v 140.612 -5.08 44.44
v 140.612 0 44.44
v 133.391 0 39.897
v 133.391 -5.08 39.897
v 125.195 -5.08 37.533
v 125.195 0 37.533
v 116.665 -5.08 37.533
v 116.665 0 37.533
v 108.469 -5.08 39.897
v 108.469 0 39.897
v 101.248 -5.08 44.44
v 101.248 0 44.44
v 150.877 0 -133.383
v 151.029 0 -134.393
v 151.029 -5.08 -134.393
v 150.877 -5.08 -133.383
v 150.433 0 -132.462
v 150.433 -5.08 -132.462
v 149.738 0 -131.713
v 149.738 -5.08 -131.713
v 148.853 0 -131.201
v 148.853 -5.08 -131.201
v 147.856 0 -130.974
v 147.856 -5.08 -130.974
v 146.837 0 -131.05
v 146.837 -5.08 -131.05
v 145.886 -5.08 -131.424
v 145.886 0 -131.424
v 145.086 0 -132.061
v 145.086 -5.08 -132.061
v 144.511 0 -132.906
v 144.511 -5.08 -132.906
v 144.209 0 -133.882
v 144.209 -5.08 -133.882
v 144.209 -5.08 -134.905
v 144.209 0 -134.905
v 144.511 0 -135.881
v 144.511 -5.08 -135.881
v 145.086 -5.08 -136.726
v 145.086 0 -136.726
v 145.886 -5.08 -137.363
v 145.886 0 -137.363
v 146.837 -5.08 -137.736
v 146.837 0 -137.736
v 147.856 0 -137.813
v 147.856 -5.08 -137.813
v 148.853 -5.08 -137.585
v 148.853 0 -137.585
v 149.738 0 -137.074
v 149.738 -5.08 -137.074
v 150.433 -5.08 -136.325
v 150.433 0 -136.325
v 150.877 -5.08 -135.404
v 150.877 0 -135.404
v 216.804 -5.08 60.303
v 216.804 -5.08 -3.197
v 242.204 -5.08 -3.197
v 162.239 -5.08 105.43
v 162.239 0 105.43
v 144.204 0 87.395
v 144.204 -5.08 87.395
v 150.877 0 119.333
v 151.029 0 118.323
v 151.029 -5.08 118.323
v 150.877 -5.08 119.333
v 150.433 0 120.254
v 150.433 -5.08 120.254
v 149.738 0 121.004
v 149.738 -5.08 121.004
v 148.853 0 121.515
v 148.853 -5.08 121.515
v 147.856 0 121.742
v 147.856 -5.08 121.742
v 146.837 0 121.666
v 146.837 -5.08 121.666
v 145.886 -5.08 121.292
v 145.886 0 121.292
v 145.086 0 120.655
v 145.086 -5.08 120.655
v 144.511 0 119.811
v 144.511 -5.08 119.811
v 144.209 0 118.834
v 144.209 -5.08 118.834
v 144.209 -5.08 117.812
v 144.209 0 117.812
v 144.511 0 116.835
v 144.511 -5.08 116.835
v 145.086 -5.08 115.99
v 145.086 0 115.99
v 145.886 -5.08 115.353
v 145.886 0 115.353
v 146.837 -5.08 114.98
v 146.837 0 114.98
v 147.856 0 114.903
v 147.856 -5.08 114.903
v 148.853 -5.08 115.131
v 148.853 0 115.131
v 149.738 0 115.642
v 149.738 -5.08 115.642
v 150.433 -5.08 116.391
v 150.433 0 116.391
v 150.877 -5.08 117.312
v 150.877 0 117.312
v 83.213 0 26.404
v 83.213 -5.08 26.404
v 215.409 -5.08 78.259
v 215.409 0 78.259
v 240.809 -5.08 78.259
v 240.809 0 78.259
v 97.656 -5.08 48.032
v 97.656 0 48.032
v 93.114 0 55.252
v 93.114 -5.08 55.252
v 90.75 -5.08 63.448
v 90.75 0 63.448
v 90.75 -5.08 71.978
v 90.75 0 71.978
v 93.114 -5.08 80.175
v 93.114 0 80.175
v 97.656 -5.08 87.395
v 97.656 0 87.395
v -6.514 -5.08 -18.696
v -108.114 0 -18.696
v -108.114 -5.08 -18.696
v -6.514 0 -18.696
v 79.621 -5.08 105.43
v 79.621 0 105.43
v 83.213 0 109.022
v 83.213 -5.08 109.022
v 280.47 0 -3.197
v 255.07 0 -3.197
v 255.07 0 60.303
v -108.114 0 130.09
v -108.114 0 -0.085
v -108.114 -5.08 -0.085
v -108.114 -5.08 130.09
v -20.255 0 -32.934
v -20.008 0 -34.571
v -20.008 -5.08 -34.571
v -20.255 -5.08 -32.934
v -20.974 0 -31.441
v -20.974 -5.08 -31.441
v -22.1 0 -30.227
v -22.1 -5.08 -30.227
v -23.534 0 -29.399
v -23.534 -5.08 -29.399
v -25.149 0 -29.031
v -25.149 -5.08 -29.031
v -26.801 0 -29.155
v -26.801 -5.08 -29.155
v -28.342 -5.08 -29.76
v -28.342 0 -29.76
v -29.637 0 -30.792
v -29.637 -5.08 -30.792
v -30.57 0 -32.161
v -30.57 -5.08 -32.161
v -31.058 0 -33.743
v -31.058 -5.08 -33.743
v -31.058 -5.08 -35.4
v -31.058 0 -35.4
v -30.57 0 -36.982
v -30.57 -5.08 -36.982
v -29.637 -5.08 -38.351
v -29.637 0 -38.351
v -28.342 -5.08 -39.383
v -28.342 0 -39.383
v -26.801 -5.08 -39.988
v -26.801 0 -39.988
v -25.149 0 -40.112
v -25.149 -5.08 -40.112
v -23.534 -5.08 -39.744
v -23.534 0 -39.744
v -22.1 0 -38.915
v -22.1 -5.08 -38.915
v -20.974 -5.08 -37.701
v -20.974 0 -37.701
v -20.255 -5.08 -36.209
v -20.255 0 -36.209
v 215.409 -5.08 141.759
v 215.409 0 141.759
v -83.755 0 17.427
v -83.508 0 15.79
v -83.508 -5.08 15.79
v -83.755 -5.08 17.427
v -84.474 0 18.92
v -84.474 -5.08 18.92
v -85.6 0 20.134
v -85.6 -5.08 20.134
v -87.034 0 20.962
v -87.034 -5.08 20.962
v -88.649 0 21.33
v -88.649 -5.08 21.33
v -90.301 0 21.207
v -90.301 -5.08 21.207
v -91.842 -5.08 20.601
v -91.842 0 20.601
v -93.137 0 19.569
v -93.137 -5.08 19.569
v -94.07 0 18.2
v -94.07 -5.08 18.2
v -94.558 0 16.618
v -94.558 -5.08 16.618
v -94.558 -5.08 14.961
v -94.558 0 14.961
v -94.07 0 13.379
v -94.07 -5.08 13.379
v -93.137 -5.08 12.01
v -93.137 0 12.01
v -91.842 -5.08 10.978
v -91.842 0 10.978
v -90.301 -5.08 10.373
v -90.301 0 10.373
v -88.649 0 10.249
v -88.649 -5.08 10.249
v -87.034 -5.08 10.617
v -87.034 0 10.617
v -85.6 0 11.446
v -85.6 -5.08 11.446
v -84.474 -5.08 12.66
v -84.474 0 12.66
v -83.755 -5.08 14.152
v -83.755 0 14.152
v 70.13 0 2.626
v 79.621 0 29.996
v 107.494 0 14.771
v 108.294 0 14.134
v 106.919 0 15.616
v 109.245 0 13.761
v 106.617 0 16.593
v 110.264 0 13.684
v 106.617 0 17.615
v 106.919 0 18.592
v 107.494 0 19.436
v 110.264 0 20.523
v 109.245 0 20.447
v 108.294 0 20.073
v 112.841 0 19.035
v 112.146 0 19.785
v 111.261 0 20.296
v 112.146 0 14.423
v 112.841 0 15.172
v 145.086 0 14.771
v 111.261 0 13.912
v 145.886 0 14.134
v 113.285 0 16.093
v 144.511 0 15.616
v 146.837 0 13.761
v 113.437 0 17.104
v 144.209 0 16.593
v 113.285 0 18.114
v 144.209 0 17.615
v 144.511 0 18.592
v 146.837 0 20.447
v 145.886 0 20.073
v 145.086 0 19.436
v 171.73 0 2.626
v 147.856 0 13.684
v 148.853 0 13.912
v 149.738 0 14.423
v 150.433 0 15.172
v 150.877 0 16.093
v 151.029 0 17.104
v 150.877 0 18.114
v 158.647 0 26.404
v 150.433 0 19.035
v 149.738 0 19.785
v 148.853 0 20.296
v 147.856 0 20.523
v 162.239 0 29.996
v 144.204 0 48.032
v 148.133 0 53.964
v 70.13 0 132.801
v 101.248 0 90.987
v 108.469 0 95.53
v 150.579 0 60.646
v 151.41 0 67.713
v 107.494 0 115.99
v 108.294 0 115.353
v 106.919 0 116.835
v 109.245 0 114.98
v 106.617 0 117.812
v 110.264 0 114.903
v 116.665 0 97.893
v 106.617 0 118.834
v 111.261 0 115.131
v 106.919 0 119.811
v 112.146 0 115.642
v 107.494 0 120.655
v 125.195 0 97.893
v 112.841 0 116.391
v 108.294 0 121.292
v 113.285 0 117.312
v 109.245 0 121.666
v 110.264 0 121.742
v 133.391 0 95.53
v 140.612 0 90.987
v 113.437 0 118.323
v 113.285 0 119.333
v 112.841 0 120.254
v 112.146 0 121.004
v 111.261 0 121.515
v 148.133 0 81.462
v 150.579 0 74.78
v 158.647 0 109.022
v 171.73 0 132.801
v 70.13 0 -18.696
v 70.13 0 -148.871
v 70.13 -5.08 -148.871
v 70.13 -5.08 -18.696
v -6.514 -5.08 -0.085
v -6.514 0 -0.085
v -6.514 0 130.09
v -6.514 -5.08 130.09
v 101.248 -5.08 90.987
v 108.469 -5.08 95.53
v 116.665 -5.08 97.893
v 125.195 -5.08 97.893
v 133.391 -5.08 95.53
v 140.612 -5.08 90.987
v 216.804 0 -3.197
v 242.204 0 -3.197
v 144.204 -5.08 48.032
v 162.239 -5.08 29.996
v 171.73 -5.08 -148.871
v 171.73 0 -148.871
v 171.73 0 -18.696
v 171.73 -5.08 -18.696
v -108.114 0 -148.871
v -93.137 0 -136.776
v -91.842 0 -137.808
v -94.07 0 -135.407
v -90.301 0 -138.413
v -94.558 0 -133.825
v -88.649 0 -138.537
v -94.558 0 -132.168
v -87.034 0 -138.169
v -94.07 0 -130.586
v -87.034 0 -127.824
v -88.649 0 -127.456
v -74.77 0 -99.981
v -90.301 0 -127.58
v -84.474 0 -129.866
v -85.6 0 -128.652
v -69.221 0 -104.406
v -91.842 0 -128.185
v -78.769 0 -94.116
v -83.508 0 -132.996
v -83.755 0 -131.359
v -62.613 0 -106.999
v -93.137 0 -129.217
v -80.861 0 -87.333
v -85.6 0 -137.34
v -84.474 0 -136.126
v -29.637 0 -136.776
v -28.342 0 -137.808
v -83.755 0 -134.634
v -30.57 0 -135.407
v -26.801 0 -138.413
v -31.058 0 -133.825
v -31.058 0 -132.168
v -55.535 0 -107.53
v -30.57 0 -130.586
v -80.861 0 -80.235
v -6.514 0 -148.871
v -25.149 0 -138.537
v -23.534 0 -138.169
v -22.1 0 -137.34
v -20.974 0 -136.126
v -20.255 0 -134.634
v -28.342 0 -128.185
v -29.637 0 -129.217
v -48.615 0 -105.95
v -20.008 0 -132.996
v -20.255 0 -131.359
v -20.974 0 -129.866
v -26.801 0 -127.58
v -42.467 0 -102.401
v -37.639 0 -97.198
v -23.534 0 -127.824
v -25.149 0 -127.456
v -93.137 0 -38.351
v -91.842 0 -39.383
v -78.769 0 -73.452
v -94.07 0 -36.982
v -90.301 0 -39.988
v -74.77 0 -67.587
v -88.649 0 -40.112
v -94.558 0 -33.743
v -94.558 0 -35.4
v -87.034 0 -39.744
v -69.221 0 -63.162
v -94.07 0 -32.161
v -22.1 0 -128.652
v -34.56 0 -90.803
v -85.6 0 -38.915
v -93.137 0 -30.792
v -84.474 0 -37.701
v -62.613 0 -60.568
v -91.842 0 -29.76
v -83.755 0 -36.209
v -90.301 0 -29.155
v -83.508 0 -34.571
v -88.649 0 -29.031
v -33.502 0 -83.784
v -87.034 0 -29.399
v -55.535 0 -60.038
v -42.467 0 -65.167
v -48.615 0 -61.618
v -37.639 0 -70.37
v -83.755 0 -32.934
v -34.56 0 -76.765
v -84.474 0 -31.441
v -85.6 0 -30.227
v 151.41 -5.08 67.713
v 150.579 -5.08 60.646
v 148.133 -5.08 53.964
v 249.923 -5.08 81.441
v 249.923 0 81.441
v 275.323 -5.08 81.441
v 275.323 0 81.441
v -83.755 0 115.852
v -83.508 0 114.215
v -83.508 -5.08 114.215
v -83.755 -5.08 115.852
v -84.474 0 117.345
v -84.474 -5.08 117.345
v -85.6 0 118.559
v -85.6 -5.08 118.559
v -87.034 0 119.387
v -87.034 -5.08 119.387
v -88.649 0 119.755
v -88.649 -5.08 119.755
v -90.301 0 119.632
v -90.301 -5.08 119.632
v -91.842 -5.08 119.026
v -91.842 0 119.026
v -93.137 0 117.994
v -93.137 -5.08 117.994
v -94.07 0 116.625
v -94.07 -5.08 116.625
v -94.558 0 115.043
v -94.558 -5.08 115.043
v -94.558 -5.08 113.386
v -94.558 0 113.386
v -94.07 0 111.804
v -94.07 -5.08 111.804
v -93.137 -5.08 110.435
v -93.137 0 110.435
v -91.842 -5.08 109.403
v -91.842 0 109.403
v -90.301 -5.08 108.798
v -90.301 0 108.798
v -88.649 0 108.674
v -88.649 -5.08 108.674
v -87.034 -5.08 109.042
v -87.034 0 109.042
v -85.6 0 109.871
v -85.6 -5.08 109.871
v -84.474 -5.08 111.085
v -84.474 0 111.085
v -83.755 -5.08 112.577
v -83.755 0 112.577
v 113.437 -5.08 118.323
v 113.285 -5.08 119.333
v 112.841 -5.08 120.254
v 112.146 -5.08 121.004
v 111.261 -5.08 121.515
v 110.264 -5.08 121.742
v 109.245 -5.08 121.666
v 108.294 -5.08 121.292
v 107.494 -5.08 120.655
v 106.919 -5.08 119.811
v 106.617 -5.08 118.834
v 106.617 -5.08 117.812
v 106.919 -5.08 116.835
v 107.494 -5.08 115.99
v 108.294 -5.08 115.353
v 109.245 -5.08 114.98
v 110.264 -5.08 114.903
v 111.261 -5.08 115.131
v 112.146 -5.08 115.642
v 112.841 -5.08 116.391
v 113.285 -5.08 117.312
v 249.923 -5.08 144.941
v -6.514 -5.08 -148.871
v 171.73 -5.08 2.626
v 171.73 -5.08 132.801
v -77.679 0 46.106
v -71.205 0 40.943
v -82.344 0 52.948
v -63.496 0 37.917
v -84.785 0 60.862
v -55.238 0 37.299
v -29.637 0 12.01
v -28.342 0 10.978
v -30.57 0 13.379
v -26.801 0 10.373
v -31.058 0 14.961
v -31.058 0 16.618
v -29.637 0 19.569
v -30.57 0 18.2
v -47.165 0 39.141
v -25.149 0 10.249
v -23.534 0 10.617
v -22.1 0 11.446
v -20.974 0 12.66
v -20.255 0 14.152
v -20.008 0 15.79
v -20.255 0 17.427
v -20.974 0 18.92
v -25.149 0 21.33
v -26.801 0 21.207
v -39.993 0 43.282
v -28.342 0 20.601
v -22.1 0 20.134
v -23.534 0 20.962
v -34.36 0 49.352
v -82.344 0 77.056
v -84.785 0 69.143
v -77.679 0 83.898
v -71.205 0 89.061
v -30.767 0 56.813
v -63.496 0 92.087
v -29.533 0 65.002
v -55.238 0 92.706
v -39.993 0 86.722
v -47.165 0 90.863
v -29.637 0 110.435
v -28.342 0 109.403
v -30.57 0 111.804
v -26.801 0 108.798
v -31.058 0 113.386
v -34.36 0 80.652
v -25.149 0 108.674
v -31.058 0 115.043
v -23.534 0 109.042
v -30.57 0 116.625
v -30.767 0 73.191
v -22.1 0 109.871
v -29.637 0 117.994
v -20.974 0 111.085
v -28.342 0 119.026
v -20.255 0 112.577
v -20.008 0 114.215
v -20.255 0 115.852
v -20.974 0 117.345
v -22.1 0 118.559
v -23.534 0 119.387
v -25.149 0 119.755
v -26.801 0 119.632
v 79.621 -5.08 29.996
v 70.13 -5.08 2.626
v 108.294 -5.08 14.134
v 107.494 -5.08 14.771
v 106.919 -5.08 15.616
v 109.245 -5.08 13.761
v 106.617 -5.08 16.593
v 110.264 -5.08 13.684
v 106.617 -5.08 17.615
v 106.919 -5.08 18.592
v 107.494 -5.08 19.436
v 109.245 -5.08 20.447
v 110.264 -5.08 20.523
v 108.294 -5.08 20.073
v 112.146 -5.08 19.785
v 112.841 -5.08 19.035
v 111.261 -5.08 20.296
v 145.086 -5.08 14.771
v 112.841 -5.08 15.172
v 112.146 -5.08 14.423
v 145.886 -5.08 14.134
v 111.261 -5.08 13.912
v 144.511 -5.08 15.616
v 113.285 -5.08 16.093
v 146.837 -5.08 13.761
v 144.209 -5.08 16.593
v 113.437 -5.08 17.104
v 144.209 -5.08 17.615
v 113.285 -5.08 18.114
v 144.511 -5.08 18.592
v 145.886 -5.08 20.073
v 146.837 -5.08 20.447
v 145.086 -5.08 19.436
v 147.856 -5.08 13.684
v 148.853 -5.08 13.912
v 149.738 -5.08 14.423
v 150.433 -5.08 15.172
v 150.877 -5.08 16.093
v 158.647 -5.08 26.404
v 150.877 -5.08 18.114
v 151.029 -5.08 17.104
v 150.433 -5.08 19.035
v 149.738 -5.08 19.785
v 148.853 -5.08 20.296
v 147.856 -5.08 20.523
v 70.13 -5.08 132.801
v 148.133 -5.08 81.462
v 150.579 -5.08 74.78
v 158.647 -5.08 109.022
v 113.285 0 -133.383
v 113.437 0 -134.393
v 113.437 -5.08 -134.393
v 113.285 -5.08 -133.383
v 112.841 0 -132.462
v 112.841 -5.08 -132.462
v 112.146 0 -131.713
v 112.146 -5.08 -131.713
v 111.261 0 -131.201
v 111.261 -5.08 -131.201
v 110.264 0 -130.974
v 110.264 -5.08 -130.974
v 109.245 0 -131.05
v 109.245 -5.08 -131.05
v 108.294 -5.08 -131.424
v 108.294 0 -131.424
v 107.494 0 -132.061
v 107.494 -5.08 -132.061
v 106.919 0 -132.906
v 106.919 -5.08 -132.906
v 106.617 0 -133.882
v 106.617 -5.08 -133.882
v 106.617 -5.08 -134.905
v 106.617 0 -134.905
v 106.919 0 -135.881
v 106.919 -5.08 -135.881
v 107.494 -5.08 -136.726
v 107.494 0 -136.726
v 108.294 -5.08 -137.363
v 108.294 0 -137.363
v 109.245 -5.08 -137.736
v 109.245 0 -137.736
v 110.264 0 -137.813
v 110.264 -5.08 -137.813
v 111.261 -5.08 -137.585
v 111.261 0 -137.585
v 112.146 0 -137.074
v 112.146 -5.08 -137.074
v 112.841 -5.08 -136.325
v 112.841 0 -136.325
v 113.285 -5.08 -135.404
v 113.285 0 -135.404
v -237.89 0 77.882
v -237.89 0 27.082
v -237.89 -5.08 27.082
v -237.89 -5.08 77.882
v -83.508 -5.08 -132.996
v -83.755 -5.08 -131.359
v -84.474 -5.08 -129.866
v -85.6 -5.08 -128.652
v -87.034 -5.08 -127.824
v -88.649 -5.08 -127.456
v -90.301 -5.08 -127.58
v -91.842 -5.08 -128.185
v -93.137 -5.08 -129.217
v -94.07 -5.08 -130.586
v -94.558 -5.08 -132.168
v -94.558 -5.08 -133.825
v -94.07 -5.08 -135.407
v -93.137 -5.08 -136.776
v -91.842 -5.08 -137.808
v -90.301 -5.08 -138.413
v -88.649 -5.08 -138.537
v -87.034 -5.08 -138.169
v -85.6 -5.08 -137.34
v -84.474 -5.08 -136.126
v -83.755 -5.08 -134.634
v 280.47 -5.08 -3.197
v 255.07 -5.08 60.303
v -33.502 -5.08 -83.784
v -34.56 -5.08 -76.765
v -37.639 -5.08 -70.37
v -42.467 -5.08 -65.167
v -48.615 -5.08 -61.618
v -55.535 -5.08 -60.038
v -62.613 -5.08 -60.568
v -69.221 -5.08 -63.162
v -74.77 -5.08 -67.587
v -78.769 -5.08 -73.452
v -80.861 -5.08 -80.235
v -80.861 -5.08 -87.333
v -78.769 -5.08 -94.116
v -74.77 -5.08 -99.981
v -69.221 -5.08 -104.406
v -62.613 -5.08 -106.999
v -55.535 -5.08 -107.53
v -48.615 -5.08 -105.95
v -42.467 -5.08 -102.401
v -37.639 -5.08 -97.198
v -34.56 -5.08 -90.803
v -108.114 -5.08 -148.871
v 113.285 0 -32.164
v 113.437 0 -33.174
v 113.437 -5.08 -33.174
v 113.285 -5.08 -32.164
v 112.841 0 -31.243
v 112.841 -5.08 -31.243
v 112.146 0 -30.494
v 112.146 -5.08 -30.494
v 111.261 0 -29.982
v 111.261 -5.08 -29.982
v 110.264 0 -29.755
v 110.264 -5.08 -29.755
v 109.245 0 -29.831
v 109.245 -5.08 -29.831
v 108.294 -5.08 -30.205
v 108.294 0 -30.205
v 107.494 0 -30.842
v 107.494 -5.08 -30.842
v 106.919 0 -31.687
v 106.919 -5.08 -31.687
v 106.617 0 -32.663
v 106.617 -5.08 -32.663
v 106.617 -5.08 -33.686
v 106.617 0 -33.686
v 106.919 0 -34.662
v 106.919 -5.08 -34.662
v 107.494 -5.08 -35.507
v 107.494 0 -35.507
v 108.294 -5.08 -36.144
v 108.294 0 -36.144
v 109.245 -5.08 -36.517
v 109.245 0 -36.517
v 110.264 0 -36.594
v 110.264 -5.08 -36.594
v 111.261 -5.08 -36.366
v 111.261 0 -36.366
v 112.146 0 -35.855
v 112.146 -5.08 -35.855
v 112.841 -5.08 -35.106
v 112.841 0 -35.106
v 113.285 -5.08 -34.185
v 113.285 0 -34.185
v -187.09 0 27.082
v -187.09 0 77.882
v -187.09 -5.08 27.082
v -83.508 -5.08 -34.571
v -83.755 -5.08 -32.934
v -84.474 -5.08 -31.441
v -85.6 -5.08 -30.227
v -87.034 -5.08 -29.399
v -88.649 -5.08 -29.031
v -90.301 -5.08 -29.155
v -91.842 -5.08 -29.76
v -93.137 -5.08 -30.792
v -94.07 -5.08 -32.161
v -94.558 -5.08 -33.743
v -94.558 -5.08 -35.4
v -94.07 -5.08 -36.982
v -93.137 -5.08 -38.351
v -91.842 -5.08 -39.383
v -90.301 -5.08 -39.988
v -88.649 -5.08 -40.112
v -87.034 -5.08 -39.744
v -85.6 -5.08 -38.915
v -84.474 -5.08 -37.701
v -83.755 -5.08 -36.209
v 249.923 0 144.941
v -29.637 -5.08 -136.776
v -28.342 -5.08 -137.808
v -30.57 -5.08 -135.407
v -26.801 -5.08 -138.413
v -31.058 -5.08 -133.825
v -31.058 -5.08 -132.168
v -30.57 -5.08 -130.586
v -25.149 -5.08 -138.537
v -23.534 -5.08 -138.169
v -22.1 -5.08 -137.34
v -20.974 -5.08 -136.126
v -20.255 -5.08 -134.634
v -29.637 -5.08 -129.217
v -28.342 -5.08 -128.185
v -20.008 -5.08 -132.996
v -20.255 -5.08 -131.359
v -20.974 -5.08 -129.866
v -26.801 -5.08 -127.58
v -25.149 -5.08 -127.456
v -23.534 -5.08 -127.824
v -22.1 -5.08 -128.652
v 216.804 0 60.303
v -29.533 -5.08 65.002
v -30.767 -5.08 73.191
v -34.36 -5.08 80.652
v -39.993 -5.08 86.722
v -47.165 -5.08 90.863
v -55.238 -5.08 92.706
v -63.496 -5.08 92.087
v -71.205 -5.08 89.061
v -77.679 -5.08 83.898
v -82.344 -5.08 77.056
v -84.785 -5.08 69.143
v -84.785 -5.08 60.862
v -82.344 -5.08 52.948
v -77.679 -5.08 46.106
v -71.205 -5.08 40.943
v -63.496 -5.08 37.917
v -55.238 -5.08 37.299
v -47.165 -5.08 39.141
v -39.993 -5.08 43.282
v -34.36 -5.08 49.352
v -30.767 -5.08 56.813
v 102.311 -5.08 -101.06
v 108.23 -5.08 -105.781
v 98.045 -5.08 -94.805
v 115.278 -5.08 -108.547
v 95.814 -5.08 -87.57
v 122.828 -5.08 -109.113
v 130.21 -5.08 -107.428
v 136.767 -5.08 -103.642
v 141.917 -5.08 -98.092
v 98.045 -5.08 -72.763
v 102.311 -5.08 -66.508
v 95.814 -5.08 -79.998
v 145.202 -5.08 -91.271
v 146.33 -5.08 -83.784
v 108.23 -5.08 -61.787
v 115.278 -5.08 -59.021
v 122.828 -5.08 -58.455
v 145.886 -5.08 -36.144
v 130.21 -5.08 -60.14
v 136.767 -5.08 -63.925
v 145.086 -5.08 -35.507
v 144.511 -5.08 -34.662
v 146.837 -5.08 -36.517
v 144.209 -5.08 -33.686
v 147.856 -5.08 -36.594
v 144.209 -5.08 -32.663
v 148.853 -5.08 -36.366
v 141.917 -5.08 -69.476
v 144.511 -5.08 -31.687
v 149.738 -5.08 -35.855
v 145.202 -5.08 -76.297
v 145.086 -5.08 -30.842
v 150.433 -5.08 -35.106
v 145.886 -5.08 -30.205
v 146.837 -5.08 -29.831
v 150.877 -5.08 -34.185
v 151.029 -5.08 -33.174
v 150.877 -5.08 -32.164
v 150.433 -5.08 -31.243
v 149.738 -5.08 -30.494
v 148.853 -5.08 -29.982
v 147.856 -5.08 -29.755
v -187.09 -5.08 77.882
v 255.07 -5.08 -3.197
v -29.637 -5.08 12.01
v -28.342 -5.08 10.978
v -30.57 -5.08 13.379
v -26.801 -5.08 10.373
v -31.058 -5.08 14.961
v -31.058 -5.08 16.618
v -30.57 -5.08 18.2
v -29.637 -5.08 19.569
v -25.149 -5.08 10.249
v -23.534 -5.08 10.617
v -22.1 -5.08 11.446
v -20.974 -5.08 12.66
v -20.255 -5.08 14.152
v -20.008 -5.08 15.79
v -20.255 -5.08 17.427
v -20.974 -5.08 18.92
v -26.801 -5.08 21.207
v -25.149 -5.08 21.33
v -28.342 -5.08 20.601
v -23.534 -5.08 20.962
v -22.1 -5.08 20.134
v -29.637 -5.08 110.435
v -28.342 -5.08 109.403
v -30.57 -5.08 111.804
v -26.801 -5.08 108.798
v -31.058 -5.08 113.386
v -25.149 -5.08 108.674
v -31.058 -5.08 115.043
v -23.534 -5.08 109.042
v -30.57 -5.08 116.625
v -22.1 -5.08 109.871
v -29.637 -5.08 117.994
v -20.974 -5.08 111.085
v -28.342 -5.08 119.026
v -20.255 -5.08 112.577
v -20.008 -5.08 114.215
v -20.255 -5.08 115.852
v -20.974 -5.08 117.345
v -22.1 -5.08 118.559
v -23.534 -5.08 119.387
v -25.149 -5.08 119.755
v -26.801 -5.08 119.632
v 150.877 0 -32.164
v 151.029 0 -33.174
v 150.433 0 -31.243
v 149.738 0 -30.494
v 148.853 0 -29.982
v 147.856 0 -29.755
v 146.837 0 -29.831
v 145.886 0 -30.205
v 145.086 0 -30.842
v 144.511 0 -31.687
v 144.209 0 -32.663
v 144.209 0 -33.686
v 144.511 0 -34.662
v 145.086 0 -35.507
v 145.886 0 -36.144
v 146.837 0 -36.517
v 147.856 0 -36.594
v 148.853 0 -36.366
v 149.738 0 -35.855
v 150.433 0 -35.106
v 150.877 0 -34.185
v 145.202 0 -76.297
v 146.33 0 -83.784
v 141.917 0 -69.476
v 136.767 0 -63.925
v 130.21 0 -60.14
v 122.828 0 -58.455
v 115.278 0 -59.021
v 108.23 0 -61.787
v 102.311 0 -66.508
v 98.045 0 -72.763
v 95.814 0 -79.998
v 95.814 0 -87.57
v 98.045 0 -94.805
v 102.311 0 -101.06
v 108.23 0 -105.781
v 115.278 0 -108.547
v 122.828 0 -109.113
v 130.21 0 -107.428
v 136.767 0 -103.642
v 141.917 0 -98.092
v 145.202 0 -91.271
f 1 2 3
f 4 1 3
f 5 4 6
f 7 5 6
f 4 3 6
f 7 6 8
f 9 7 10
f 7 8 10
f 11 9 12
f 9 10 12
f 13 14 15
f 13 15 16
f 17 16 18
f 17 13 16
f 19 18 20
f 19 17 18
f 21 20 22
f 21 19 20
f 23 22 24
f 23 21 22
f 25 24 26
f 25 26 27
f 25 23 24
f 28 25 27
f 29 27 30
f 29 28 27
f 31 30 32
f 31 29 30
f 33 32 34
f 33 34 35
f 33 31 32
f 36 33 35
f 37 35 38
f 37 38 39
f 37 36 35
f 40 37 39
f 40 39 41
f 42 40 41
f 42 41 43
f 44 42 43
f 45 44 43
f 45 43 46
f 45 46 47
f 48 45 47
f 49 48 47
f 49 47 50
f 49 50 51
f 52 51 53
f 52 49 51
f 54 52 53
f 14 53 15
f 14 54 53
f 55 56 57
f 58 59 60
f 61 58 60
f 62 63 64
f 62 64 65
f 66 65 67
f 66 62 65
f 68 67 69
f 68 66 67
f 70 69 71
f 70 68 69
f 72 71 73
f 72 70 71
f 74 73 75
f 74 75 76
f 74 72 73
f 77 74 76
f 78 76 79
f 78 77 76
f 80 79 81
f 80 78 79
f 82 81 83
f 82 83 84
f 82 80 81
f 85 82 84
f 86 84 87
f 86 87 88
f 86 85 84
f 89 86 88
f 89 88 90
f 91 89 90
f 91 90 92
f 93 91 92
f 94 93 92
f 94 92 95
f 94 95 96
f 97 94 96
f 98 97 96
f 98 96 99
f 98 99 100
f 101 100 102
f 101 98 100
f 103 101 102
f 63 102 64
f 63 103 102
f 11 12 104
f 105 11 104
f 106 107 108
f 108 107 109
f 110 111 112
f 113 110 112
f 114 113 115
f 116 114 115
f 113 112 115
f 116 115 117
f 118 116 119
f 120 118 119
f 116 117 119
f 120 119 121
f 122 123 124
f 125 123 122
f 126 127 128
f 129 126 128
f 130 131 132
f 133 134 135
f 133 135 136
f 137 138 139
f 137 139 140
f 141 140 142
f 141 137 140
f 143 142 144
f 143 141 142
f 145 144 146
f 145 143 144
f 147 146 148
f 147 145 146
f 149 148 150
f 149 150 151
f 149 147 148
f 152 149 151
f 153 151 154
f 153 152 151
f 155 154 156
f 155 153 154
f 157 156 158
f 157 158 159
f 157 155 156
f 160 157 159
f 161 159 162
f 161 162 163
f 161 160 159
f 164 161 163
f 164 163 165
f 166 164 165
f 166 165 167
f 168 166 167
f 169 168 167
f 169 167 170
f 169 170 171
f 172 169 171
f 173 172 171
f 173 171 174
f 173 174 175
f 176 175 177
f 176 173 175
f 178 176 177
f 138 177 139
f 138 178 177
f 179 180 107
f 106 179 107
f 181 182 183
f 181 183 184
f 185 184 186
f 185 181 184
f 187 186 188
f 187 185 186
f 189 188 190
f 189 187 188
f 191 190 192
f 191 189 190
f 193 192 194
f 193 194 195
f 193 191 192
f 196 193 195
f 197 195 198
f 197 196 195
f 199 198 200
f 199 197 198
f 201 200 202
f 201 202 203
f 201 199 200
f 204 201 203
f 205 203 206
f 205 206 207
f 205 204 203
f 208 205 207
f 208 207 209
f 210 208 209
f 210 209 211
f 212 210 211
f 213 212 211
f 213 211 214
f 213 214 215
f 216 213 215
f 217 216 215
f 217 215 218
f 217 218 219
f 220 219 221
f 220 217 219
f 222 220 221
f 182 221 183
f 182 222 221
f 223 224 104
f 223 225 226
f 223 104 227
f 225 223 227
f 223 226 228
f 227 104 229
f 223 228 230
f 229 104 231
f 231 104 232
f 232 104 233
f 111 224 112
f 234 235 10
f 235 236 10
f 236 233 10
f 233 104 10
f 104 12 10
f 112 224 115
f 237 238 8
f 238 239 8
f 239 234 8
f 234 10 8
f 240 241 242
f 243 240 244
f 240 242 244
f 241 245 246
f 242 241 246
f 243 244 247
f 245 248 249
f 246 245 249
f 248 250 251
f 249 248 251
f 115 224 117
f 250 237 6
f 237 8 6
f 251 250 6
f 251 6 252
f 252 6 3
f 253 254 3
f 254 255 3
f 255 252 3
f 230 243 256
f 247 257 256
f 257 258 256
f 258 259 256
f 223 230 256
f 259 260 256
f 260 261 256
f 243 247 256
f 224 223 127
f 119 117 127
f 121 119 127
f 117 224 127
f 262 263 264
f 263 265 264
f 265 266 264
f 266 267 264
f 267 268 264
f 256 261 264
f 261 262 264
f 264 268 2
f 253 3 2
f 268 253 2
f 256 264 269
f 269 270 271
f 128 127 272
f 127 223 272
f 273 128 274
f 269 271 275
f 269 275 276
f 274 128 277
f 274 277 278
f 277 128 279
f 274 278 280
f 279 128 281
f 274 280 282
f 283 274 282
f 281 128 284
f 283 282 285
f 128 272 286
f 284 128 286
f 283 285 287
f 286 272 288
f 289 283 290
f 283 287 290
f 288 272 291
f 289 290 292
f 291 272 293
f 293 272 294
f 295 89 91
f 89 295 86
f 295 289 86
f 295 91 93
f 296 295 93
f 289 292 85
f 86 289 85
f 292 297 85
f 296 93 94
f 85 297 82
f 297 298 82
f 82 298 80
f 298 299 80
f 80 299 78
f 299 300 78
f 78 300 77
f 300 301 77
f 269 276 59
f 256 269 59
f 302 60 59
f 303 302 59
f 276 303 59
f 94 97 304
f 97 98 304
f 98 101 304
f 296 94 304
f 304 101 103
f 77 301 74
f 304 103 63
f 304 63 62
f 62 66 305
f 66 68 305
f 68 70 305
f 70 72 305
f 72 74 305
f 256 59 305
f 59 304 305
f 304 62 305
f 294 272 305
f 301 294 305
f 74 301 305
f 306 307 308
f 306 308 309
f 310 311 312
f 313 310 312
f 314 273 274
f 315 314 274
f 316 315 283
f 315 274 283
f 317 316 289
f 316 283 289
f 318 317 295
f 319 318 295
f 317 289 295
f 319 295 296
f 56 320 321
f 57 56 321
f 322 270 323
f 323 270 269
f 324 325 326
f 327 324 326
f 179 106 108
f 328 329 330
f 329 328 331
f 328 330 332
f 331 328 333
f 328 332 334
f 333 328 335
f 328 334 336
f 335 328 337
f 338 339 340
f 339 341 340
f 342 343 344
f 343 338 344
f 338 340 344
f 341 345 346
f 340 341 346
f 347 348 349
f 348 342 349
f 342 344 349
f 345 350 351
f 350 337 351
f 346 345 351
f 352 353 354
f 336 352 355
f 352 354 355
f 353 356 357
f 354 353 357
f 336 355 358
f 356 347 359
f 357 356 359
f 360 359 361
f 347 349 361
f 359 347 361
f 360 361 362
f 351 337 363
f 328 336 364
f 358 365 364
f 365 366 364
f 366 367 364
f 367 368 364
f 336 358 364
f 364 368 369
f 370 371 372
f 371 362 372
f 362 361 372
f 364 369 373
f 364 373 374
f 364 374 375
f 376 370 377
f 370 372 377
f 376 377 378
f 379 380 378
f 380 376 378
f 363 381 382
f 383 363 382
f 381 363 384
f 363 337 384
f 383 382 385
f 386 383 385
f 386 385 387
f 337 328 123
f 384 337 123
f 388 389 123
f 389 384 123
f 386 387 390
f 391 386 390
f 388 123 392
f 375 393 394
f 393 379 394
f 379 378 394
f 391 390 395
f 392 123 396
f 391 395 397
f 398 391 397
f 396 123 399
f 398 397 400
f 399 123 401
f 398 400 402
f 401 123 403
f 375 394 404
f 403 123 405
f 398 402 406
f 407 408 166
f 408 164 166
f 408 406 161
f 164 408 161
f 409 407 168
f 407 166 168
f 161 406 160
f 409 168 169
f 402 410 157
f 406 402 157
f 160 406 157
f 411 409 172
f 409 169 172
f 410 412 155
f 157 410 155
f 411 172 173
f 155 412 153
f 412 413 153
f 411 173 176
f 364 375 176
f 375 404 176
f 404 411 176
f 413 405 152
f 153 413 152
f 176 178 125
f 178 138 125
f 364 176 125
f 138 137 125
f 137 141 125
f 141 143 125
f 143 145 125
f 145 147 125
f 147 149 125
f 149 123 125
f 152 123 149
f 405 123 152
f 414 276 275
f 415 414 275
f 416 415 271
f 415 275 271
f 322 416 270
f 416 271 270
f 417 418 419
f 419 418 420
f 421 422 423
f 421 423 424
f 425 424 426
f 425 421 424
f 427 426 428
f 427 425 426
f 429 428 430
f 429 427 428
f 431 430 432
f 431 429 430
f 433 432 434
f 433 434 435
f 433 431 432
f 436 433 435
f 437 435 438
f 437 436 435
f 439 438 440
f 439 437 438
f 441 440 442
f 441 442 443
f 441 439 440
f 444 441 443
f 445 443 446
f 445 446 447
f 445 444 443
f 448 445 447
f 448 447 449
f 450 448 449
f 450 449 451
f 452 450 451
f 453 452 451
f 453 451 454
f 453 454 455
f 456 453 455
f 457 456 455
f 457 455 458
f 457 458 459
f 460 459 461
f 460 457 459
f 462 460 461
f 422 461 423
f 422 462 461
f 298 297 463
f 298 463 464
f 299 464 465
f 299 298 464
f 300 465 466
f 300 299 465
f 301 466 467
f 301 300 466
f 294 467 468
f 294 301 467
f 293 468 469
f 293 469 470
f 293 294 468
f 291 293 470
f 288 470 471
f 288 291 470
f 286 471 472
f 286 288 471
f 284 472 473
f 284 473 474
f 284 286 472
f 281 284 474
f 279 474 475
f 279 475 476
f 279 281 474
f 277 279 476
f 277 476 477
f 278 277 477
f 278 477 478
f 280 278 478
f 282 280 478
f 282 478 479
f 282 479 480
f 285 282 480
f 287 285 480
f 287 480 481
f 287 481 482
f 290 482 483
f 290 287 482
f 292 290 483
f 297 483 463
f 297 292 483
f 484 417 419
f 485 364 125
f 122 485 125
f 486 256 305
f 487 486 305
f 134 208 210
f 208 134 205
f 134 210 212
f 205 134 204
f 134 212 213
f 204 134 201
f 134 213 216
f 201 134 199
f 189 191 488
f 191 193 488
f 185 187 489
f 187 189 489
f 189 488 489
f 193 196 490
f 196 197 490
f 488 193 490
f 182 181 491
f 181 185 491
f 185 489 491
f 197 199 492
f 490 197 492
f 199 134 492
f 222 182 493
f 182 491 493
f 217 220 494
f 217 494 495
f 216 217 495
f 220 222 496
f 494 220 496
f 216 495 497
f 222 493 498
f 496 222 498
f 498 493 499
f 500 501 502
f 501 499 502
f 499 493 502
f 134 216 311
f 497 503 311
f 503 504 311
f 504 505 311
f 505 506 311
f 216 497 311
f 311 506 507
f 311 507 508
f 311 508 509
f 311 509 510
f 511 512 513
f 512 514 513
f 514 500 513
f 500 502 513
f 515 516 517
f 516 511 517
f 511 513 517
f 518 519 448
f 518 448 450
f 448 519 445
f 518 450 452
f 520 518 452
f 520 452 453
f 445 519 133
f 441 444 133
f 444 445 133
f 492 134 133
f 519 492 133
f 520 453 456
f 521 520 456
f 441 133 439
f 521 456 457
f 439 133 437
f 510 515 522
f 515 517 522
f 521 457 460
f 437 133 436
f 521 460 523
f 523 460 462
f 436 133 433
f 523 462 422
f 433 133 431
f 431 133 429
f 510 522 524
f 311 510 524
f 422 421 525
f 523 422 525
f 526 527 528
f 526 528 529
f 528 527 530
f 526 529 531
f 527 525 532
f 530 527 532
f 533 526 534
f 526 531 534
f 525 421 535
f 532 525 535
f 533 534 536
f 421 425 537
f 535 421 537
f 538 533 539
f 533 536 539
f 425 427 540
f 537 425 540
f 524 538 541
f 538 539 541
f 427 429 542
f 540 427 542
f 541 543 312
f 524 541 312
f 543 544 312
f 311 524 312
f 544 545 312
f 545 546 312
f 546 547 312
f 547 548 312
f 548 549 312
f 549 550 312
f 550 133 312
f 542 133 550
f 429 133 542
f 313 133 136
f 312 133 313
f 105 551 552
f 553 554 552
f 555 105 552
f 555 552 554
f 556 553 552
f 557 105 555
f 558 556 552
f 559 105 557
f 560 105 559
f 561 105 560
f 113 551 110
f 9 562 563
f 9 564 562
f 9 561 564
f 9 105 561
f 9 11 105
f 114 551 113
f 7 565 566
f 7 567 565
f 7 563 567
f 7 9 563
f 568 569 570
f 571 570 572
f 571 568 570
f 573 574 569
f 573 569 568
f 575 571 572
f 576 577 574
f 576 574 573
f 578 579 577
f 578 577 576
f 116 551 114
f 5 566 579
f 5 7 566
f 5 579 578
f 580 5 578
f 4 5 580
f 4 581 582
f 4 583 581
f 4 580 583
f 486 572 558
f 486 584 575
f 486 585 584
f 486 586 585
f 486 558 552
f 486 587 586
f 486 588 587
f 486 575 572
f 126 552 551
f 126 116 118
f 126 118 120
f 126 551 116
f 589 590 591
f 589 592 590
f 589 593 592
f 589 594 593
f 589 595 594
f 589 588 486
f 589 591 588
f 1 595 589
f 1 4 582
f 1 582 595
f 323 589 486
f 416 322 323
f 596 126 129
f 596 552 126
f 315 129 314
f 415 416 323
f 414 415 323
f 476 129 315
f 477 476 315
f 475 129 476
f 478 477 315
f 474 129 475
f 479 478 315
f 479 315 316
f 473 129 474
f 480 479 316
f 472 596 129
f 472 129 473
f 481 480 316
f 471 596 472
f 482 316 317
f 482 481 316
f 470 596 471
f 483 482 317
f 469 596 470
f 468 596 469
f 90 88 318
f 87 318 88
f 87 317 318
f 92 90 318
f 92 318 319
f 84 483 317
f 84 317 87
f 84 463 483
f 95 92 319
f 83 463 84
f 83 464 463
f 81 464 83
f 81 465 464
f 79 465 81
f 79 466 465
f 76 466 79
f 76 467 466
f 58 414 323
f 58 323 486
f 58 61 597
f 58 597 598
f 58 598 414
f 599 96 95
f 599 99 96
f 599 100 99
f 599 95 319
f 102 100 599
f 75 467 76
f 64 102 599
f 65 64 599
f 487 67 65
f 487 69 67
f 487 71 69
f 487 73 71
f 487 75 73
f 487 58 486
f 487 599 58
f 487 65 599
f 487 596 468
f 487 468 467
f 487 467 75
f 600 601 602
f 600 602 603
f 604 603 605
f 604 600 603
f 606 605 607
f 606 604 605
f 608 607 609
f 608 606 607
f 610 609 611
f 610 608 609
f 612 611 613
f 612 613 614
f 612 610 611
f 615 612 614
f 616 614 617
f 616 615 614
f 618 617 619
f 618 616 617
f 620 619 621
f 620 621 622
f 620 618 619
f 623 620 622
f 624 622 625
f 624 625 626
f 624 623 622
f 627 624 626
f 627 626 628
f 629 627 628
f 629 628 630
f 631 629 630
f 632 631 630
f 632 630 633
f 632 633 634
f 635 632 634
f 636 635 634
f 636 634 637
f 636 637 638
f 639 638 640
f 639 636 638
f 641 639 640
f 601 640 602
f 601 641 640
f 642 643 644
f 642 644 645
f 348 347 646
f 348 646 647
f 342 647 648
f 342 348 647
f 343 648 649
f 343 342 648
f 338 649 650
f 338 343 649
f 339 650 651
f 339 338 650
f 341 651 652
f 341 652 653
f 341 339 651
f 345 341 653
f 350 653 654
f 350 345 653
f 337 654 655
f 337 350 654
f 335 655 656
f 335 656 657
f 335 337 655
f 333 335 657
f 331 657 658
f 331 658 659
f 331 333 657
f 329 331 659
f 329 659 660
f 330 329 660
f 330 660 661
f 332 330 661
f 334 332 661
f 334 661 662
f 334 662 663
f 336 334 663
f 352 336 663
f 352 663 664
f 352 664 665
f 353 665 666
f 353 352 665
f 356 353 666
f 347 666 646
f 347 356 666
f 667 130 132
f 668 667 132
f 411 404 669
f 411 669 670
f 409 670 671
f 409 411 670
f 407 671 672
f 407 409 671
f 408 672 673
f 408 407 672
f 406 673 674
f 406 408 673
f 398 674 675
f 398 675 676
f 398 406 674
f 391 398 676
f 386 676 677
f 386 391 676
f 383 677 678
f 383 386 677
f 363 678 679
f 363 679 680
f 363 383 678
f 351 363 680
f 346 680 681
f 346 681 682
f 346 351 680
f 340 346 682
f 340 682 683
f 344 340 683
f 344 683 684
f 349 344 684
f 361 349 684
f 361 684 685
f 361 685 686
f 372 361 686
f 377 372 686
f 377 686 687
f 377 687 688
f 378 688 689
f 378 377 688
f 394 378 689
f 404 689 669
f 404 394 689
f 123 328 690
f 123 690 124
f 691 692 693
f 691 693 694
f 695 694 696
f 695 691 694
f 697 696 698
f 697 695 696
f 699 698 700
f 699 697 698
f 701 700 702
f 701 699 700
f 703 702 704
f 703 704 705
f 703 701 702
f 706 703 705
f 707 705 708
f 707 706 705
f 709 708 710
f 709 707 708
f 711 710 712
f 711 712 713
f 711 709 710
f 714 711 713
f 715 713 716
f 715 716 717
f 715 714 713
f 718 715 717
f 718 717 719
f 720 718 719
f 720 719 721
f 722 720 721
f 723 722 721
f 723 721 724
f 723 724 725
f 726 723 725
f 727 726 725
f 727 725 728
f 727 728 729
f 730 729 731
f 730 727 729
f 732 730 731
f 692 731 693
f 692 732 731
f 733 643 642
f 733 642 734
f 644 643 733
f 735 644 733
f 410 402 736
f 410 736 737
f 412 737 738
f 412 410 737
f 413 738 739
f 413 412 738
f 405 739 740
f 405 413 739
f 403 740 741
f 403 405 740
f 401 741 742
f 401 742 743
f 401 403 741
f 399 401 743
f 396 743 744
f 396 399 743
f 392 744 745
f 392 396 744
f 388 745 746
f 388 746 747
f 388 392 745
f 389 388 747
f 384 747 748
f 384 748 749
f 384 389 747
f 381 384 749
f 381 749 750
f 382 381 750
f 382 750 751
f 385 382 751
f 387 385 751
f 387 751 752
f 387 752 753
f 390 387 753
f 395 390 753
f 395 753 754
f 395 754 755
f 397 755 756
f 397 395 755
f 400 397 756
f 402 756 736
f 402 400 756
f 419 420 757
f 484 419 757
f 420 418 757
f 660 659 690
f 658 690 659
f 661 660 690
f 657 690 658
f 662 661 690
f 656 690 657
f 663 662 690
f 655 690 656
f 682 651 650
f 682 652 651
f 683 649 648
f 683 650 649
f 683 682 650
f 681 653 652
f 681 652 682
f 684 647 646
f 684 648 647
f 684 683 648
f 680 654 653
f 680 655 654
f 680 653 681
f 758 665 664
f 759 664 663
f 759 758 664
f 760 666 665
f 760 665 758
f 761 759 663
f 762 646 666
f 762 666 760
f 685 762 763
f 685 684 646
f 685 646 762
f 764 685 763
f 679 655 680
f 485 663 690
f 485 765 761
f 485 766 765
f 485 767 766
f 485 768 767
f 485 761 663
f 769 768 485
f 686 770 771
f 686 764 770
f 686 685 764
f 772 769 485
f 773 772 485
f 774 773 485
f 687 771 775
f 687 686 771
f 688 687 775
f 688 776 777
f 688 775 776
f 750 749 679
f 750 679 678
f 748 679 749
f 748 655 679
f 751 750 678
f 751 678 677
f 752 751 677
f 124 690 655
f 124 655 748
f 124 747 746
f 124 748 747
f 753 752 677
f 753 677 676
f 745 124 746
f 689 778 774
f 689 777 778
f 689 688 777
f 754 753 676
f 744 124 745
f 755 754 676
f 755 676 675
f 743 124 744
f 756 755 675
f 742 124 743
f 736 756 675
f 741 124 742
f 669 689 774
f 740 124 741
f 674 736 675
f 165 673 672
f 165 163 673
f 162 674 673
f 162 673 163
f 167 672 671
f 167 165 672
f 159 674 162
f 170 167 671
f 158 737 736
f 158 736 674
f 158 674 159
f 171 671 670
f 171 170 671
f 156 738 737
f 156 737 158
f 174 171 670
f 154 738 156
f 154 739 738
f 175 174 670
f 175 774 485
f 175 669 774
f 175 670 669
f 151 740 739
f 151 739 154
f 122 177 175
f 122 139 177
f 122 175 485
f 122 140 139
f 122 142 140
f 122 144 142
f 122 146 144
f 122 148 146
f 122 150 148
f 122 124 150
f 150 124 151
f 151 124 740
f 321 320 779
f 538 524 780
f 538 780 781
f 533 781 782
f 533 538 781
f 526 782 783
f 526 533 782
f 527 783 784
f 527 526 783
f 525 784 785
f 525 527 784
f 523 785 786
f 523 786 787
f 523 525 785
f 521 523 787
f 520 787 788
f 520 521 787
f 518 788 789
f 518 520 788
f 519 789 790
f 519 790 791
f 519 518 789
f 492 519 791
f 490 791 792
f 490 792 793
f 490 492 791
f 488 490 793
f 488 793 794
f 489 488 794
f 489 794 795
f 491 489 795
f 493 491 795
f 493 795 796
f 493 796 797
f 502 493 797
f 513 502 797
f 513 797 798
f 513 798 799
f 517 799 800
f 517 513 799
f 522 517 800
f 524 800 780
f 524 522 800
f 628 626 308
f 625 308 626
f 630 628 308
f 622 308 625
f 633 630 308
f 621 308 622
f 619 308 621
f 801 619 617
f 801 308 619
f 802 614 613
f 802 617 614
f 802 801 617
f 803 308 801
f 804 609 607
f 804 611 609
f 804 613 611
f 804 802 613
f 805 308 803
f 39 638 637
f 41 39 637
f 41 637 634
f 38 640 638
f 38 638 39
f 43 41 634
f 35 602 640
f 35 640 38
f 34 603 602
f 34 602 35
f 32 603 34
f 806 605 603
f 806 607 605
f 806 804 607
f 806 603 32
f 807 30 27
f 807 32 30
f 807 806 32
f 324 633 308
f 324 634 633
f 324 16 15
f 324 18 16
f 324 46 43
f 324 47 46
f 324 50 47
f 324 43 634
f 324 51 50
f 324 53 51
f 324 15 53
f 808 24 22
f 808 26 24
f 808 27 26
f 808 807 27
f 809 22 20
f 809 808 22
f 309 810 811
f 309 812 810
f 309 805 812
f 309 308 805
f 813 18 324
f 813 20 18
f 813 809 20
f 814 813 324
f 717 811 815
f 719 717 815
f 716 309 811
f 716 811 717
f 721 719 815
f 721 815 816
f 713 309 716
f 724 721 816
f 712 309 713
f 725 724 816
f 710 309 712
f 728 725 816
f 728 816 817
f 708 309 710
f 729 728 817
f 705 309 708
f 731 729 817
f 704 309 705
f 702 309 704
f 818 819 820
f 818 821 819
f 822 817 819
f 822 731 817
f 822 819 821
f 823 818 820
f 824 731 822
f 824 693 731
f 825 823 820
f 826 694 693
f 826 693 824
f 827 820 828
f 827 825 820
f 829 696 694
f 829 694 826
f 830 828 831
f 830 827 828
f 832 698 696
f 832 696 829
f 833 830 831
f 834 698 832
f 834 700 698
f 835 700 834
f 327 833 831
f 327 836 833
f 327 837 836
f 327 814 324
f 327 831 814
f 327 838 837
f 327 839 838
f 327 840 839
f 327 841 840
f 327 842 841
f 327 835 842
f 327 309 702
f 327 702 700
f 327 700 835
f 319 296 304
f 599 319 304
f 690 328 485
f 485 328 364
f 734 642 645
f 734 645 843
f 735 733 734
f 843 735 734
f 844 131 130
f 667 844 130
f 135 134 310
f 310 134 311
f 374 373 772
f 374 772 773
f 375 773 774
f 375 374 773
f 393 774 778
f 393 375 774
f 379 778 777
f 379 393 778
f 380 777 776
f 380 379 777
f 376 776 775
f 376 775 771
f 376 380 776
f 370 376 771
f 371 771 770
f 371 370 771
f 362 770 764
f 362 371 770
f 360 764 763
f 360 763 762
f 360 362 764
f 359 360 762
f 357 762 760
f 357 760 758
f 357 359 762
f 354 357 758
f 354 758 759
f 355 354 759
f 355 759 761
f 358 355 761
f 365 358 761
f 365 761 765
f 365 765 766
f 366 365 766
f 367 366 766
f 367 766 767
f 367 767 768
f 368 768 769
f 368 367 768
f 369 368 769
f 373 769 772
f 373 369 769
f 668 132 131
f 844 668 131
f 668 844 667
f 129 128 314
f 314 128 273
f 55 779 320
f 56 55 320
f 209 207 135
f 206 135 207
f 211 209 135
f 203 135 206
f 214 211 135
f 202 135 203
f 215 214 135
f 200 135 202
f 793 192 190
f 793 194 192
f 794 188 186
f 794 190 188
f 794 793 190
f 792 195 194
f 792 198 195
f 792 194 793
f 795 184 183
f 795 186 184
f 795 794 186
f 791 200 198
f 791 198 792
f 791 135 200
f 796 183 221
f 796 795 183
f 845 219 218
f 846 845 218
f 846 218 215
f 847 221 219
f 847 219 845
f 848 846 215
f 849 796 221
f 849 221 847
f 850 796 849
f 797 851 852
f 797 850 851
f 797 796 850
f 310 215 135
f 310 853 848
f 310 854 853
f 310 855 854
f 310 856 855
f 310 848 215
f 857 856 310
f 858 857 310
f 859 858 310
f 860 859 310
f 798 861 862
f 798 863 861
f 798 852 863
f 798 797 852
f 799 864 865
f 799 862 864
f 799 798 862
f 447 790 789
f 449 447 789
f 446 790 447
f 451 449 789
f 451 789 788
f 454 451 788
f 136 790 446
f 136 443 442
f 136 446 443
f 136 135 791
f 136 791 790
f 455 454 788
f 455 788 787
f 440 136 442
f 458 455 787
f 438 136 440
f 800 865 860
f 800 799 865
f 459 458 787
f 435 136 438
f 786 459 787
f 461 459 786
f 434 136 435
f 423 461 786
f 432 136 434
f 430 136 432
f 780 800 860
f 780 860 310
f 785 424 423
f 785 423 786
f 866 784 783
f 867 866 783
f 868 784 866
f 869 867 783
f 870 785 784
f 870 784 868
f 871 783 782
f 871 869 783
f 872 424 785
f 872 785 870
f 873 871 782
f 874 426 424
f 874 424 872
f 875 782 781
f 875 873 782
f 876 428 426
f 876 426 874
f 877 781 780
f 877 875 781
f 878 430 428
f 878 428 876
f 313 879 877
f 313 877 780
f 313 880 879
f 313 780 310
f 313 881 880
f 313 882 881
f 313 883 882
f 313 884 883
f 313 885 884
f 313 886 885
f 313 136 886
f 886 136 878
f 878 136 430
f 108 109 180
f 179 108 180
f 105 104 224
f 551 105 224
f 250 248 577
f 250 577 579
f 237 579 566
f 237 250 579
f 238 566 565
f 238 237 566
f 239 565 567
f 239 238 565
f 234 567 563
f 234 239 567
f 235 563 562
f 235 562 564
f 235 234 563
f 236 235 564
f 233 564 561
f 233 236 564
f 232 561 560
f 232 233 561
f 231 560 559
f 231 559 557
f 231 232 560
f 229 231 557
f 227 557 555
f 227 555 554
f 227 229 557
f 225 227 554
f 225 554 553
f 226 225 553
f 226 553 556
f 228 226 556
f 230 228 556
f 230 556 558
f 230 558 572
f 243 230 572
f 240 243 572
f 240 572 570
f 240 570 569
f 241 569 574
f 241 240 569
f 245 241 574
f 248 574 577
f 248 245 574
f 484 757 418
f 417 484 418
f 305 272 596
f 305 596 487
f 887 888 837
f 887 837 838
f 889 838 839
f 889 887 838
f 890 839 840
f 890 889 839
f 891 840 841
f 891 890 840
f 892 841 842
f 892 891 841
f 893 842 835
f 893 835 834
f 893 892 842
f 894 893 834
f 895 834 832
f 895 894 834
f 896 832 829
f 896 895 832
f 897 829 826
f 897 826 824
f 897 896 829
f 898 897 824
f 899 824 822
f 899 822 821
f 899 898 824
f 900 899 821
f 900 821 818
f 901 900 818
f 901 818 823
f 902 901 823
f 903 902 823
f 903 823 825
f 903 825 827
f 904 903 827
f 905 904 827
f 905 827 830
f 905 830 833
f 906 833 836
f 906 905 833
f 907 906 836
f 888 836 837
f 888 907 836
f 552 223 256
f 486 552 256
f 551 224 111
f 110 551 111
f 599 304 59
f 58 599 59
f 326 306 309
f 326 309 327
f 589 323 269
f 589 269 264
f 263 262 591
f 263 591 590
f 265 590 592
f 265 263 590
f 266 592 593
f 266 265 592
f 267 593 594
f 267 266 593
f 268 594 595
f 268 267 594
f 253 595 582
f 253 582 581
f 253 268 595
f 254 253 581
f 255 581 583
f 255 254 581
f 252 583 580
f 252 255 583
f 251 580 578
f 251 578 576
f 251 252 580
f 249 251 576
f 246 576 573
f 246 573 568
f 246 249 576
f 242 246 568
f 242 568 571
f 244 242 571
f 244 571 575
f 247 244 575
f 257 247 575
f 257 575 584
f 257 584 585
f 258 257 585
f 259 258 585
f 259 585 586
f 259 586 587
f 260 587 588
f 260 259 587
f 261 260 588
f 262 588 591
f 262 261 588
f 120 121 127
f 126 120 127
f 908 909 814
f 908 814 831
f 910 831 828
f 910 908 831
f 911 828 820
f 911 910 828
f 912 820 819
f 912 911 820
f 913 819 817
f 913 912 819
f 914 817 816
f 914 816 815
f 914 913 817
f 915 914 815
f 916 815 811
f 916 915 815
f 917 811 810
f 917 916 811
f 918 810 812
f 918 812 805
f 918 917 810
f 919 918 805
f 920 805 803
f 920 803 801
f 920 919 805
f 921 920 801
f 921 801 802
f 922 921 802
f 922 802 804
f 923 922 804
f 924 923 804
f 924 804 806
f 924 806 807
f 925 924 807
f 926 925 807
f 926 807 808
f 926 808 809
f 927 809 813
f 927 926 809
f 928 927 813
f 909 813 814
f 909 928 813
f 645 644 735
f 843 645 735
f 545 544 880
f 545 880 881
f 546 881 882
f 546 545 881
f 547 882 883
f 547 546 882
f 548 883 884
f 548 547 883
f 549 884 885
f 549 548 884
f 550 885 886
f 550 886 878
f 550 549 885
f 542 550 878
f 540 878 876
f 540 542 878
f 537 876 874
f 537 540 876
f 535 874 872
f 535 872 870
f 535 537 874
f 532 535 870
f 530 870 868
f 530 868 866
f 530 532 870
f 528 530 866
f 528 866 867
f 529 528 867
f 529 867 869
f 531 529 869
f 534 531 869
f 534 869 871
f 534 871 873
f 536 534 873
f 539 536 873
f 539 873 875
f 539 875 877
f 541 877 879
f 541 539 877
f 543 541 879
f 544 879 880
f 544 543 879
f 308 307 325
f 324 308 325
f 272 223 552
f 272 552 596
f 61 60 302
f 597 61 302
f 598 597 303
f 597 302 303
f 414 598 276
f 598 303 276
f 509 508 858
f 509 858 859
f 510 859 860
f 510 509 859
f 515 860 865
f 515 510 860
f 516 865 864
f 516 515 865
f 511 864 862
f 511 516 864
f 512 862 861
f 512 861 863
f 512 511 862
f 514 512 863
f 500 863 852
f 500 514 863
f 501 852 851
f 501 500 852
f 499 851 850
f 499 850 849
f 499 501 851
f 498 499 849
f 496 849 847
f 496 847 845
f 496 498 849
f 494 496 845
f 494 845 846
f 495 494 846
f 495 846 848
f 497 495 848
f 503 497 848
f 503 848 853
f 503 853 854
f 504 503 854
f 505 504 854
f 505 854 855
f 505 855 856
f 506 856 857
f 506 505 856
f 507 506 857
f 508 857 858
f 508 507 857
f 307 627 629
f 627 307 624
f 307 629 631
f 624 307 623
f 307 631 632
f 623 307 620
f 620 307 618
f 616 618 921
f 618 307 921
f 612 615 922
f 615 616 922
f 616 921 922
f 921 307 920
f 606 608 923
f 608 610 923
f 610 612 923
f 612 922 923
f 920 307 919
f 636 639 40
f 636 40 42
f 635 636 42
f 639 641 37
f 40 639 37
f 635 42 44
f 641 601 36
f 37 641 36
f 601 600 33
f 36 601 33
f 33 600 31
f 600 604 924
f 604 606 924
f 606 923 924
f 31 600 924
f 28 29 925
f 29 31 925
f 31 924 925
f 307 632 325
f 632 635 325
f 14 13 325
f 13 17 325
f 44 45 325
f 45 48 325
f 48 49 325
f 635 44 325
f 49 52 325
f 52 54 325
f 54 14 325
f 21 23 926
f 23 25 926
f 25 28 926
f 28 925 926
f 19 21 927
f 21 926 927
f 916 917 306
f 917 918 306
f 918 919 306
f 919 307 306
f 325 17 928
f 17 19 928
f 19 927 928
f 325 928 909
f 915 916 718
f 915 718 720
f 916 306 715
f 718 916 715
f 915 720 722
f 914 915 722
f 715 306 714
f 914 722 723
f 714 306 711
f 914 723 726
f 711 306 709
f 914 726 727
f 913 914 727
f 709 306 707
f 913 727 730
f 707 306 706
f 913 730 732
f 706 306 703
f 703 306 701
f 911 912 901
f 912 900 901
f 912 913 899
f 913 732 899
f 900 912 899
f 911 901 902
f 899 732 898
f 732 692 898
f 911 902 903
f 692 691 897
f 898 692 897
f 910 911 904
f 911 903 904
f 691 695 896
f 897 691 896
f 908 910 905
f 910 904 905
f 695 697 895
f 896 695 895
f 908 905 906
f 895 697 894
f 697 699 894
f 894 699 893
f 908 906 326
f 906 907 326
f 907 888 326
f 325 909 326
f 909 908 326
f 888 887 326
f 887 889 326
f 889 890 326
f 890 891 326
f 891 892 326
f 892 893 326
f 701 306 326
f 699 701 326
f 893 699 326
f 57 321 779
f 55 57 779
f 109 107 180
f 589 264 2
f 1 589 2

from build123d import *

# Parameters (mm, degrees)
F0_W     = 101.6
F0_H     = 130.175
F0_R     = 5.55625
F0_R_2   = 27.78125
F0_R_3   = 3.429
F0_R_4   = 25.4
F0_R_5   = 23.8125
F0_W_2   = 50.8
F0_H_2   = 50.8
F1_DEPTH = 5.08


with BuildPart() as f1:
    # F0 (on Front) → F1 (new body)
    with BuildSketch(Plane.XZ):
        with Locations((-57.314304, 65.002098)):
            Rectangle(F0_W, F0_H)
        with Locations((-89.064304, 15.789598)):
            Circle(F0_R, mode=Mode.SUBTRACT)
        with Locations((-25.564304, 15.789598)):
            Circle(F0_R, mode=Mode.SUBTRACT)
        with Locations((-57.314304, 65.002098)):
            Circle(F0_R_2, mode=Mode.SUBTRACT)
        with Locations((-89.064304, 114.214598)):
            Circle(F0_R, mode=Mode.SUBTRACT)
        with Locations((-25.564304, 114.214598)):
            Circle(F0_R, mode=Mode.SUBTRACT)
        with Locations((120.930071, 67.713253)):
            Rectangle(F0_W, F0_H)
        with Locations((110.008071, 17.103753)):
            Circle(F0_R_3, mode=Mode.SUBTRACT)
        with Locations((147.600071, 17.103753)):
            Circle(F0_R_3, mode=Mode.SUBTRACT)
        with BuildLine():
            ThreePointArc((144.203771, 87.39485), (149.551853, 78.192948), (151.410071, 67.713253))
            ThreePointArc((151.410071, 67.713253), (149.551853, 57.233558), (144.203771, 48.031655))
            Line((144.203771, 48.031655), (162.239249, 29.996177))
            ThreePointArc((162.239249, 29.996177), (162.239249, 26.404075), (158.647147, 26.404075))
            Line((158.647147, 26.404075), (140.611669, 44.439553))
            ThreePointArc((140.611669, 44.439553), (120.930071, 37.233253), (101.248473, 44.439553))
            Line((101.248473, 44.439553), (83.212995, 26.404075))
            ThreePointArc((83.212995, 26.404075), (79.620893, 26.404075), (79.620893, 29.996177))
            Line((79.620893, 29.996177), (97.656371, 48.031655))
            ThreePointArc((97.656371, 48.031655), (90.450071, 67.713253), (97.656371, 87.39485))
            Line((97.656371, 87.39485), (79.620893, 105.430328))
            ThreePointArc((79.620893, 105.430328), (79.620893, 109.022431), (83.212995, 109.022431))
            Line((83.212995, 109.022431), (101.248473, 90.986953))
            ThreePointArc((101.248473, 90.986953), (120.930071, 98.193253), (140.611669, 90.986953))
            Line((140.611669, 90.986953), (158.647147, 109.022431))
            ThreePointArc((158.647147, 109.022431), (162.239249, 109.022431), (162.239249, 105.430328))
            Line((162.239249, 105.430328), (144.203771, 87.39485))
        make_face(mode=Mode.SUBTRACT)
        with Locations((110.008071, 118.322753)):
            Circle(F0_R_3, mode=Mode.SUBTRACT)
        with Locations((147.600071, 118.322753)):
            Circle(F0_R_3, mode=Mode.SUBTRACT)
        with Locations((120.930071, -83.783946)):
            Rectangle(F0_W, F0_H)
        with Locations((110.008071, -134.393446)):
            Circle(F0_R_3, mode=Mode.SUBTRACT)
        with Locations((147.600071, -134.393446)):
            Circle(F0_R_3, mode=Mode.SUBTRACT)
        with Locations((120.930071, -83.783946)):
            Circle(F0_R_4, mode=Mode.SUBTRACT)
        with Locations((110.008071, -33.174446)):
            Circle(F0_R_3, mode=Mode.SUBTRACT)
        with Locations((147.600071, -33.174446)):
            Circle(F0_R_3, mode=Mode.SUBTRACT)
        with Locations((-57.314304, -83.783946)):
            Rectangle(F0_W, F0_H)
        with Locations((-89.064304, -132.996446)):
            Circle(F0_R, mode=Mode.SUBTRACT)
        with Locations((-25.564304, -132.996446)):
            Circle(F0_R, mode=Mode.SUBTRACT)
        with Locations((-57.314304, -83.783946)):
            Circle(F0_R_5, mode=Mode.SUBTRACT)
        with Locations((-89.064304, -34.571446)):
            Circle(F0_R, mode=Mode.SUBTRACT)
        with Locations((-25.564304, -34.571446)):
            Circle(F0_R, mode=Mode.SUBTRACT)
        Polygon((240.809383, 78.258727), (215.409383, 141.758727), (215.409383, 78.258727), align=None)
        Polygon((275.322852, 81.440644), (249.922852, 144.940644), (249.922852, 81.440644), align=None)
        Polygon((242.20367, -3.197299), (216.80367, 60.302701), (216.80367, -3.197299), align=None)
        Polygon((280.469911, -3.197299), (255.069911, 60.302701), (255.069911, -3.197299), align=None)
        with BuildLine():
            Line((79.620893, 105.430328), (83.212995, 109.022431))
            ThreePointArc((83.212995, 109.022431), (79.620893, 109.022431), (79.620893, 105.430328))
        make_face()
        with BuildLine():
            Line((158.647147, 109.022431), (162.239249, 105.430328))
            ThreePointArc((162.239249, 105.430328), (162.239249, 109.022431), (158.647147, 109.022431))
        make_face()
        with BuildLine():
            ThreePointArc((158.647147, 26.404075), (162.239249, 26.404075), (162.239249, 29.996177))
            Line((162.239249, 29.996177), (158.647147, 26.404075))
        make_face()
        with BuildLine():
            ThreePointArc((79.620893, 29.996177), (79.620893, 26.404075), (83.212995, 26.404075))
            Line((83.212995, 26.404075), (79.620893, 29.996177))
        make_face()
        with Locations((-212.489558, 52.482126)):
            Rectangle(F0_W_2, F0_H_2)
    extrude(amount=F1_DEPTH)


solid = f1.part
